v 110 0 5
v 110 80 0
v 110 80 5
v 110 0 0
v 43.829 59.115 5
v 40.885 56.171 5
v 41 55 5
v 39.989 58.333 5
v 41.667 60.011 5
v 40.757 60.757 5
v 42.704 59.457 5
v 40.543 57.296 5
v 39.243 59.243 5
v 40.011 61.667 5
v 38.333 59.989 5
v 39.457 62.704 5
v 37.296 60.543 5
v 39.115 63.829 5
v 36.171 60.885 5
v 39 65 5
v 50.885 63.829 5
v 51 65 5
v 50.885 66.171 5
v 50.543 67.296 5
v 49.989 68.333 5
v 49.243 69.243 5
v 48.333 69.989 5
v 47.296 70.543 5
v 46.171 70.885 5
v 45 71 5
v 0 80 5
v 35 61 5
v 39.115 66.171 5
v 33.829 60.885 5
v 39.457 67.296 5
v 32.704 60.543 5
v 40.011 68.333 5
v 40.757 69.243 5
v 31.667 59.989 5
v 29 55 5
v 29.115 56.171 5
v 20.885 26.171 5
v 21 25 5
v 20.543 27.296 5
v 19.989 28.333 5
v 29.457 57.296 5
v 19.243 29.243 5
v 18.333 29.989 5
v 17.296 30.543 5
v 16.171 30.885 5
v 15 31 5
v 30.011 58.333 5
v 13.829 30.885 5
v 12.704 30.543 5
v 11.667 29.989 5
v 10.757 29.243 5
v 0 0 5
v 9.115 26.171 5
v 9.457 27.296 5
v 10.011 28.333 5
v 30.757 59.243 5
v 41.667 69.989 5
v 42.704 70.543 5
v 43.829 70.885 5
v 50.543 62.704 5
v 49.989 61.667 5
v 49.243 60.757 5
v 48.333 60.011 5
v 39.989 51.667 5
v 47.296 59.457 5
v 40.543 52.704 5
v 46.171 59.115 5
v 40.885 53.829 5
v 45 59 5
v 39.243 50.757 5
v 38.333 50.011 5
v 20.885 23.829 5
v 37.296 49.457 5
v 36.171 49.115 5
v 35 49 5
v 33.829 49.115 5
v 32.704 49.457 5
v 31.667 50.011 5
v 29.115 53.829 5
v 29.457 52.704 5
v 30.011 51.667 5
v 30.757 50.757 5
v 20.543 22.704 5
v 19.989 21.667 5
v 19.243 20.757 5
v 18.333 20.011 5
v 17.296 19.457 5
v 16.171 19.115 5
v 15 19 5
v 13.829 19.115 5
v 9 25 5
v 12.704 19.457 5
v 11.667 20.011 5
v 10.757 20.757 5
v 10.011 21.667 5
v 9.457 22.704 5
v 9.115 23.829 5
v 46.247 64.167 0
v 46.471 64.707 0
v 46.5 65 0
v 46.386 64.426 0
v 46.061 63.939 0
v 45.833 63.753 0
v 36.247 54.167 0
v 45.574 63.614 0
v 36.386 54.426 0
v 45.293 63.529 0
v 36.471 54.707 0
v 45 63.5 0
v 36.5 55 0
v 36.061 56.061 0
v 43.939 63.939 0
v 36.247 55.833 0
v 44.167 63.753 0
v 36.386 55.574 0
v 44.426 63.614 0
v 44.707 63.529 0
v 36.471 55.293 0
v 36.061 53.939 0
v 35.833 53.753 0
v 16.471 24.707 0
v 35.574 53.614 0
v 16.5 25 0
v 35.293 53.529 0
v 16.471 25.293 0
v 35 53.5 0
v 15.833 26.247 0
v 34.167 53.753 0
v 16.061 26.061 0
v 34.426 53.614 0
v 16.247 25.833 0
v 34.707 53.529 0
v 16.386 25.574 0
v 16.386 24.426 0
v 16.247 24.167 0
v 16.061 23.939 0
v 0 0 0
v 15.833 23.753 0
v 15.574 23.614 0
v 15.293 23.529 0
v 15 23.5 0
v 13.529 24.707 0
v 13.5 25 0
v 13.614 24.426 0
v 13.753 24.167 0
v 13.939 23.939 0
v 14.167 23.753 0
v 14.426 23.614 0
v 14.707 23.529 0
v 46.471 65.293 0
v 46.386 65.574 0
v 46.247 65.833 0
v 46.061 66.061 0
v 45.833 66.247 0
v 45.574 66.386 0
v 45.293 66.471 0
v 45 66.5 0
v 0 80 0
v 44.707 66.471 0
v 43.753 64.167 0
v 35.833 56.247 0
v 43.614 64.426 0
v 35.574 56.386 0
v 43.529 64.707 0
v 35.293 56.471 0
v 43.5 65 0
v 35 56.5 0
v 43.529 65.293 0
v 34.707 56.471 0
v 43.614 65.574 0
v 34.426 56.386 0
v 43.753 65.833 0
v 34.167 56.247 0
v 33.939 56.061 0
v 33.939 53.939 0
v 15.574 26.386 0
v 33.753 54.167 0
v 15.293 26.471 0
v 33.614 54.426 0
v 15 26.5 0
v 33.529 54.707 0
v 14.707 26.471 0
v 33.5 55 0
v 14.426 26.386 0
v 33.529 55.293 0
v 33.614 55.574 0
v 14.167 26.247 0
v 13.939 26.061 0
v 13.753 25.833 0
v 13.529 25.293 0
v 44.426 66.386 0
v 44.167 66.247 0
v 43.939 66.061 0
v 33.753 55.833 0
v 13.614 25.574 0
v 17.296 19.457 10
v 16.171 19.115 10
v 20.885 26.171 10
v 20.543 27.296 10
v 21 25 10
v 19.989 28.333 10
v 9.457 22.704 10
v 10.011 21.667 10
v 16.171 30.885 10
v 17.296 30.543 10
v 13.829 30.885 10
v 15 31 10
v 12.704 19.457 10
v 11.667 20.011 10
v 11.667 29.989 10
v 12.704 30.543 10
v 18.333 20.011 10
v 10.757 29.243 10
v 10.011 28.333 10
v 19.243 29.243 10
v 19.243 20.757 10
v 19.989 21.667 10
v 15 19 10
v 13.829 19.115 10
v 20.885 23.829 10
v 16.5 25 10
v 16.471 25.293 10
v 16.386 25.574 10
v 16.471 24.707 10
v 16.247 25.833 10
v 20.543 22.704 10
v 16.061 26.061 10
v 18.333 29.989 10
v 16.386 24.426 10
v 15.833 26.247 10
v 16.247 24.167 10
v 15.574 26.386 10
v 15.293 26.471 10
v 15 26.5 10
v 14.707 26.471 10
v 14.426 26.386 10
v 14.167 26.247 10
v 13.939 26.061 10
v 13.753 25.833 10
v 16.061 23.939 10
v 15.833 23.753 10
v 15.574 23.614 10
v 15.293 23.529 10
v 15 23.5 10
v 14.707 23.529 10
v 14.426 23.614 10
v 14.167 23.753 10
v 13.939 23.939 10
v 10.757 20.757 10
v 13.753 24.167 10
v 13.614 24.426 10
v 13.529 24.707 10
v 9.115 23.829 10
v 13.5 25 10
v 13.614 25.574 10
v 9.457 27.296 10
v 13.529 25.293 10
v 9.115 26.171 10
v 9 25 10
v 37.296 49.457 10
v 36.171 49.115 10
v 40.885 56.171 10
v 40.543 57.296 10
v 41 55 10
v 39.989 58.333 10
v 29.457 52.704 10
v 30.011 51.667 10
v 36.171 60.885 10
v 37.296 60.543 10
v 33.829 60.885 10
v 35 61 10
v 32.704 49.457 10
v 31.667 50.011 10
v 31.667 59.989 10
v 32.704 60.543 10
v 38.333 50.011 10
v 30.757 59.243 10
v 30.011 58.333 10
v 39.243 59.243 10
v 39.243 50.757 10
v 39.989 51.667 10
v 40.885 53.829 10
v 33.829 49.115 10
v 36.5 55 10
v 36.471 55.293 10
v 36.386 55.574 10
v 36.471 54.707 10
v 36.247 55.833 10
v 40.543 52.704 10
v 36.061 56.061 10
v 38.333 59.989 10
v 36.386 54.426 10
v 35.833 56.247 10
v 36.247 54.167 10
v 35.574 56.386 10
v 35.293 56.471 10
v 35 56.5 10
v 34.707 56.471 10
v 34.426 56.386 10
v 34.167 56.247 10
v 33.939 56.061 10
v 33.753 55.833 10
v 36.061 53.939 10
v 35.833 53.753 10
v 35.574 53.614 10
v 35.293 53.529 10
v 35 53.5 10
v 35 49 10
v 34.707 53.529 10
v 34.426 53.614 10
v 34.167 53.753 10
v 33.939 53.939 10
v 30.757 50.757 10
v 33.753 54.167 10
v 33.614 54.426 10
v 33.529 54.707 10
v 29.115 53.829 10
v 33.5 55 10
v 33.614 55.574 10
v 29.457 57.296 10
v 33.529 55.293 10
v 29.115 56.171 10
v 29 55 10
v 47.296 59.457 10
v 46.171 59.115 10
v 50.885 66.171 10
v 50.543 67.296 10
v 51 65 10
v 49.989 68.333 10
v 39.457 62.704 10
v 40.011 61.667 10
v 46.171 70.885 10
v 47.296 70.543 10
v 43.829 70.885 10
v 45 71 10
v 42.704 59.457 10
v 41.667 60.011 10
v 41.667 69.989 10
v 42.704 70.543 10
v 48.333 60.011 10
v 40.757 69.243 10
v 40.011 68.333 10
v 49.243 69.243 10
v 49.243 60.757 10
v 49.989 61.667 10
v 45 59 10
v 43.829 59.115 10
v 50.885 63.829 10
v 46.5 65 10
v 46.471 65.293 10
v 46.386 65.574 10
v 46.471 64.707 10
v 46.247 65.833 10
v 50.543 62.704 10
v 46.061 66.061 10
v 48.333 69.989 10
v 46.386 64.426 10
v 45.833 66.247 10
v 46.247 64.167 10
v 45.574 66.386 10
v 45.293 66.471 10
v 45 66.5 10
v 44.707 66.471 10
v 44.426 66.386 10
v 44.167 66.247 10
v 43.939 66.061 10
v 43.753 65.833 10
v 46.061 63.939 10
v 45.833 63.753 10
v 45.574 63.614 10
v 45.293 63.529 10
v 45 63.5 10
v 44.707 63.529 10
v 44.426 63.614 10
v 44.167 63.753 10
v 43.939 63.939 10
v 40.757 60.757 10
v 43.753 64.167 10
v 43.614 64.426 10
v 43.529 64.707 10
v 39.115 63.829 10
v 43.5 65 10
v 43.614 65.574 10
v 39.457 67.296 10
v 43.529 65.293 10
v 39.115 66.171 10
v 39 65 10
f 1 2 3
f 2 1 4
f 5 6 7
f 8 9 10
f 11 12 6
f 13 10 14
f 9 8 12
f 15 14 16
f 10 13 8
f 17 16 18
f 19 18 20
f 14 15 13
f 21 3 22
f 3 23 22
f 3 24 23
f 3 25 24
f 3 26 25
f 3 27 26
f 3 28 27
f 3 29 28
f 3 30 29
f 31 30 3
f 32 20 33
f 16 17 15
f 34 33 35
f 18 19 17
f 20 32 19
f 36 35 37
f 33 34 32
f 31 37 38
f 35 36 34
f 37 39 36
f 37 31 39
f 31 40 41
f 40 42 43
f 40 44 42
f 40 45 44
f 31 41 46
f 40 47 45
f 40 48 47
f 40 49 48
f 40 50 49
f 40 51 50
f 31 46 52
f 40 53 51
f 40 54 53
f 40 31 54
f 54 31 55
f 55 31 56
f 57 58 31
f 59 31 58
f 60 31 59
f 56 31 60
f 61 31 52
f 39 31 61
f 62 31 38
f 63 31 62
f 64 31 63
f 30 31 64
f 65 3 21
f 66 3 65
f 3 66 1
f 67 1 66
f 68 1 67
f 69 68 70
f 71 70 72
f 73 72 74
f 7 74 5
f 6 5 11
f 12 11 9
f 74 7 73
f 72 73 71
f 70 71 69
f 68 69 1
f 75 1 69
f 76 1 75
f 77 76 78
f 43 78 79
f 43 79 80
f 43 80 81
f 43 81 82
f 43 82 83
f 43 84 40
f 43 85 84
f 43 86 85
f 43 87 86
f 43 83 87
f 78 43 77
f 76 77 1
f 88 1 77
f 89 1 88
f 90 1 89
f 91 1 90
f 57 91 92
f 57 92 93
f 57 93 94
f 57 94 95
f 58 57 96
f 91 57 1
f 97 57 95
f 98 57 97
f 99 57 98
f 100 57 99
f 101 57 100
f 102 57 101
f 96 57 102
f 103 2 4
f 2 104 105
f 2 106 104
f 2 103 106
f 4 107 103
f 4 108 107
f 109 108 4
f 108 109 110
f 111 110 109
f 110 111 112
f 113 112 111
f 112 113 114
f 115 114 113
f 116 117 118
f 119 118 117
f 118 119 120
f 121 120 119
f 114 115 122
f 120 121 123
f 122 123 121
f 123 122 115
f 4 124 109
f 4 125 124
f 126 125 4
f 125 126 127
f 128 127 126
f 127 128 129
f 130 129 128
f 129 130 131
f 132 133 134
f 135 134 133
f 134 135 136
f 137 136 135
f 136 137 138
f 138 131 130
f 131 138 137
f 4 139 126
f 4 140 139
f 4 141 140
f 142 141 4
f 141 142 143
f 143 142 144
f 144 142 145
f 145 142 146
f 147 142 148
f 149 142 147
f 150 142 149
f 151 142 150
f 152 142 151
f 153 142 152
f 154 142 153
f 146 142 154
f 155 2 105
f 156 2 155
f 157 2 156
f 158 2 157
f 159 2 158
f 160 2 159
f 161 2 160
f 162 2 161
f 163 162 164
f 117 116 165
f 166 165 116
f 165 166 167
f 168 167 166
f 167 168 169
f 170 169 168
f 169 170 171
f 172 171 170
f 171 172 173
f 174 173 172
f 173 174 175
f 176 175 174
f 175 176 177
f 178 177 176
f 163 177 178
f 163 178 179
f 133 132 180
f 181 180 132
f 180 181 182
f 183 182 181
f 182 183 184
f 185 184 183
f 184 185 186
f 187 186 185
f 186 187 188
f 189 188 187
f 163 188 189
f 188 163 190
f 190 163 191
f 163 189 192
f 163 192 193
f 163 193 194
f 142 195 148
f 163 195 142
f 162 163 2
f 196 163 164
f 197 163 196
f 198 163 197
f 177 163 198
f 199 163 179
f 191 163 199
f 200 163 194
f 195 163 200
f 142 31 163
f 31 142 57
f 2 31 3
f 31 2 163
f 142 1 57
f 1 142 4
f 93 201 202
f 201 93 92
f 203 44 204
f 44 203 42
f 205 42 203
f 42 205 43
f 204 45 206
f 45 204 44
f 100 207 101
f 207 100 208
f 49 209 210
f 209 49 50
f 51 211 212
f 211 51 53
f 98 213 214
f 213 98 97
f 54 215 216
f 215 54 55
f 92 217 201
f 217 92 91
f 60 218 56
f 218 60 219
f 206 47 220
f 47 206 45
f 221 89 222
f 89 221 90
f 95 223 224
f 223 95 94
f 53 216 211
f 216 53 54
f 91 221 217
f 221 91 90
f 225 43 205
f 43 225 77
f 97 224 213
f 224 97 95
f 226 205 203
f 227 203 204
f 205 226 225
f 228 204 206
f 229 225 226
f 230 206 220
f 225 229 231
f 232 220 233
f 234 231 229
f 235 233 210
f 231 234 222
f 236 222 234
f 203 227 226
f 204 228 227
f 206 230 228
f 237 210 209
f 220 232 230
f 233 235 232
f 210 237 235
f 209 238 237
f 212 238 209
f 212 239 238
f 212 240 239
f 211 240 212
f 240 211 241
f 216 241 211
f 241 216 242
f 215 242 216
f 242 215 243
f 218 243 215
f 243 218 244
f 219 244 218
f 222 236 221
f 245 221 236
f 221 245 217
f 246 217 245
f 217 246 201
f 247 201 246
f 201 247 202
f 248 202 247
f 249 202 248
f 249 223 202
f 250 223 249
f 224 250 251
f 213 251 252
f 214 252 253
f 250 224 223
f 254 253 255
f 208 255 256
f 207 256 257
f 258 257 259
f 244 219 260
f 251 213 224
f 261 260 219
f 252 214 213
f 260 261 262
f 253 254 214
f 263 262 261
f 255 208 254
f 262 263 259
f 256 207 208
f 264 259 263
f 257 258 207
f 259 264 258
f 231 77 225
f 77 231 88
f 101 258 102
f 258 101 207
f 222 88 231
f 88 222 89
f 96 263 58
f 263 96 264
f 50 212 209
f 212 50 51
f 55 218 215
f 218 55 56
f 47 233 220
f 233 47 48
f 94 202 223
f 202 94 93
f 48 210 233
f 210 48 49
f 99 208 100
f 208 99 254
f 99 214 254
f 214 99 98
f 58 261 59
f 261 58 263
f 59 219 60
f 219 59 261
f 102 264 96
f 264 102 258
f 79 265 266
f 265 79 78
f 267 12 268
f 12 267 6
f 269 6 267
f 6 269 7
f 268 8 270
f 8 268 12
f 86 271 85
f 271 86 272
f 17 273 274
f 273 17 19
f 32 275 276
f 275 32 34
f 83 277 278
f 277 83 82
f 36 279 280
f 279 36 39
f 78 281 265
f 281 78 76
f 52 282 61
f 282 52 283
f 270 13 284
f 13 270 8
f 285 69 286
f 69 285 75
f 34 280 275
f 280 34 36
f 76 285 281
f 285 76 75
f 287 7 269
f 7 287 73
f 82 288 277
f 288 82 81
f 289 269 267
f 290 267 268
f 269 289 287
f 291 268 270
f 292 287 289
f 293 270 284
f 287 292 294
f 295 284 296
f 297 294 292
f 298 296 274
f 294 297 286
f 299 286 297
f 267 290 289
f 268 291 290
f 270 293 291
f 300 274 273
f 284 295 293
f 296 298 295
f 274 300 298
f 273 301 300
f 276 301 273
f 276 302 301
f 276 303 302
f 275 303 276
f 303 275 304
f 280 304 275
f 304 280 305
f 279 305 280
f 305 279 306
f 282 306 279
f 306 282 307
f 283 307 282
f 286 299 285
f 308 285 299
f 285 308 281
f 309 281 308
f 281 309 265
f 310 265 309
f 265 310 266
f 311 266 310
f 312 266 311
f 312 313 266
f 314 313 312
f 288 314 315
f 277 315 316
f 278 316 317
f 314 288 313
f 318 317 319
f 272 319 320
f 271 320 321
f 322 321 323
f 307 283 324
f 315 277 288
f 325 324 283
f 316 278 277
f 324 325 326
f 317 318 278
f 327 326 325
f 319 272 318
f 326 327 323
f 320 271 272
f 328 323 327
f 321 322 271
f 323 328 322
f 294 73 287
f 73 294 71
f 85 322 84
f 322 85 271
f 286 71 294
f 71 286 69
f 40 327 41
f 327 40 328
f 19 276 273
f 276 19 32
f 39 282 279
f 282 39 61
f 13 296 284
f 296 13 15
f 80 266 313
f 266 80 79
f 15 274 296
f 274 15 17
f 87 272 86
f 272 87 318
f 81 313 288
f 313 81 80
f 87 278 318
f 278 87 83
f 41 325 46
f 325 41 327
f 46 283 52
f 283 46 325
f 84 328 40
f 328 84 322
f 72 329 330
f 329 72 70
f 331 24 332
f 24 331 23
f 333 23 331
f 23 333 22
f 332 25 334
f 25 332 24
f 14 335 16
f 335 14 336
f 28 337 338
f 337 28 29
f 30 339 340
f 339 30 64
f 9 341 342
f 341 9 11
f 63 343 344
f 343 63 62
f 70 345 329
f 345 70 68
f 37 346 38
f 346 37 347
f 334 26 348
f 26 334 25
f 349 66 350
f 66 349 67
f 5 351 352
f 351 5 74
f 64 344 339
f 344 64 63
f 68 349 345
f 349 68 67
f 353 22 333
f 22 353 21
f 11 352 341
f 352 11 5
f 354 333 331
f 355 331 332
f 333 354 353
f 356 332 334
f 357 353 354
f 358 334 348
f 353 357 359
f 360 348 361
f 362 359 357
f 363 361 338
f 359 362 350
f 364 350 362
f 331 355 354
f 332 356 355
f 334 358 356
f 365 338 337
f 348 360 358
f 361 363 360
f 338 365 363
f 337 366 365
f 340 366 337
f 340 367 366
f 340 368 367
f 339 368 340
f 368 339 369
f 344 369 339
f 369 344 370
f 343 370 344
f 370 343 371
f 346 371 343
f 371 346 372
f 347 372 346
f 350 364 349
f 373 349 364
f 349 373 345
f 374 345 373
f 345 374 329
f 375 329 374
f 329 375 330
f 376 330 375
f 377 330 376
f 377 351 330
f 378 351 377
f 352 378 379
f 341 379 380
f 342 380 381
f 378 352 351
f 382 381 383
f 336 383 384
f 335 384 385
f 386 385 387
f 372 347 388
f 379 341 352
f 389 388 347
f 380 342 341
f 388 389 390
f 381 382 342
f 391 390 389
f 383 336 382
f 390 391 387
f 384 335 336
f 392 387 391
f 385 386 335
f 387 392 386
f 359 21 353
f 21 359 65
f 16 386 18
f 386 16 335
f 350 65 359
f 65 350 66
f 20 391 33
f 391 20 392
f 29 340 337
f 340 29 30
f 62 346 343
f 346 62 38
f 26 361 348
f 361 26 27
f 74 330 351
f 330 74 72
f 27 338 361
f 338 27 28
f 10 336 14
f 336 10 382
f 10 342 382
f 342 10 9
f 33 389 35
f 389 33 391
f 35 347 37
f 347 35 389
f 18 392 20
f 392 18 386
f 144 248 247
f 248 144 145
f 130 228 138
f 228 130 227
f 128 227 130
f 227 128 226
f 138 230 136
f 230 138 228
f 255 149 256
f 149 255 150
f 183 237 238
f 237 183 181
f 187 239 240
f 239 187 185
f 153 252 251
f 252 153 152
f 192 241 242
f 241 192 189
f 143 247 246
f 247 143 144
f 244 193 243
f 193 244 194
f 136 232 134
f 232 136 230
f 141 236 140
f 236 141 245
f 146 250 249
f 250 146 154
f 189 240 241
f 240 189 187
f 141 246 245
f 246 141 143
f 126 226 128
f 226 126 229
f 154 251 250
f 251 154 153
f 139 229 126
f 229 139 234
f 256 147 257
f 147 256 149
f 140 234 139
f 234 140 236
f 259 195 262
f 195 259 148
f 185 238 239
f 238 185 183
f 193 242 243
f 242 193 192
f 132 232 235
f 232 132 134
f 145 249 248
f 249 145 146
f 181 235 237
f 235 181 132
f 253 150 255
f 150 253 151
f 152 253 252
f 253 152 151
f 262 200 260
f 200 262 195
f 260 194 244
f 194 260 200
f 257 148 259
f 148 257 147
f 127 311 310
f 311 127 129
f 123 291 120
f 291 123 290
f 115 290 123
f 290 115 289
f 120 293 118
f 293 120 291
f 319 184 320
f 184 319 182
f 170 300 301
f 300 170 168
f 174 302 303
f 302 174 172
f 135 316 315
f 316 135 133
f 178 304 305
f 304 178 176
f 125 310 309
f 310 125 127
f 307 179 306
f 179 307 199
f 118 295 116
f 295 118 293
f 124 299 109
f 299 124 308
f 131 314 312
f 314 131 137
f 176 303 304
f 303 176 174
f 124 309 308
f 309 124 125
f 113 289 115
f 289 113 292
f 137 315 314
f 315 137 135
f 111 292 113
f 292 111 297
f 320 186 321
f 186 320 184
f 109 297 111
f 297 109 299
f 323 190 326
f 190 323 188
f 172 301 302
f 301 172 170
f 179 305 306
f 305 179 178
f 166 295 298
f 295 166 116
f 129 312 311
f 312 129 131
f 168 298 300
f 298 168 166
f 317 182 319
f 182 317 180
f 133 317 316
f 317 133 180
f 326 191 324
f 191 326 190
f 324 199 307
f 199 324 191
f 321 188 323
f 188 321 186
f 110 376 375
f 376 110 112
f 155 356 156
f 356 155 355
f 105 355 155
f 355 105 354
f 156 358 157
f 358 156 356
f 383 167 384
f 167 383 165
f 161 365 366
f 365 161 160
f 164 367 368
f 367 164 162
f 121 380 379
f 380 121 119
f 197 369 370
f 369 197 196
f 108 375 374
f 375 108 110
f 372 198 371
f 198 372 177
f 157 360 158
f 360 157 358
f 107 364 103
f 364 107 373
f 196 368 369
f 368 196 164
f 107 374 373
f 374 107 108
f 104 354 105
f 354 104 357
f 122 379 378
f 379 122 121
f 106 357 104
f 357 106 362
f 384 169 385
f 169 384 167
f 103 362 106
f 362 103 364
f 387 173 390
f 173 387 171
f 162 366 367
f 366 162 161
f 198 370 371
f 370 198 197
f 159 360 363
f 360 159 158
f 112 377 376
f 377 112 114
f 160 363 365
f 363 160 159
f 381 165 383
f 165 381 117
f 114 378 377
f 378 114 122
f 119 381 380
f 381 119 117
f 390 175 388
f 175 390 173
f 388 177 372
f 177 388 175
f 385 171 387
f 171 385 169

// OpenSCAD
$fn = 32;

// ----------------------------------------------------------------------
// Boss field: plate with bosses at given coordinates
// ----------------------------------------------------------------------

// --- parameters (mm) ---
plate_l = 110;            // plate length, X
plate_w = 80;             // plate width, Y
plate_t = 5;              // plate thickness, Z
boss_d = 12;              // boss diameter
boss_h = 5;               // boss height above the plate
bore_d = 3;               // boss bore

total_h = plate_t + boss_h;  // overall height

difference() {
  union() {
    cube([plate_l, plate_w, plate_t]);
    translate([15, 25, plate_t]) cylinder(h = boss_h, d = boss_d);
    translate([35, 55, plate_t]) cylinder(h = boss_h, d = boss_d);
    translate([45, 65, plate_t]) cylinder(h = boss_h, d = boss_d);
  }
  translate([15, 25, -1]) cylinder(h = total_h + 2, d = bore_d);
  translate([35, 55, -1]) cylinder(h = total_h + 2, d = bore_d);
  translate([45, 65, -1]) cylinder(h = total_h + 2, d = bore_d);
}
